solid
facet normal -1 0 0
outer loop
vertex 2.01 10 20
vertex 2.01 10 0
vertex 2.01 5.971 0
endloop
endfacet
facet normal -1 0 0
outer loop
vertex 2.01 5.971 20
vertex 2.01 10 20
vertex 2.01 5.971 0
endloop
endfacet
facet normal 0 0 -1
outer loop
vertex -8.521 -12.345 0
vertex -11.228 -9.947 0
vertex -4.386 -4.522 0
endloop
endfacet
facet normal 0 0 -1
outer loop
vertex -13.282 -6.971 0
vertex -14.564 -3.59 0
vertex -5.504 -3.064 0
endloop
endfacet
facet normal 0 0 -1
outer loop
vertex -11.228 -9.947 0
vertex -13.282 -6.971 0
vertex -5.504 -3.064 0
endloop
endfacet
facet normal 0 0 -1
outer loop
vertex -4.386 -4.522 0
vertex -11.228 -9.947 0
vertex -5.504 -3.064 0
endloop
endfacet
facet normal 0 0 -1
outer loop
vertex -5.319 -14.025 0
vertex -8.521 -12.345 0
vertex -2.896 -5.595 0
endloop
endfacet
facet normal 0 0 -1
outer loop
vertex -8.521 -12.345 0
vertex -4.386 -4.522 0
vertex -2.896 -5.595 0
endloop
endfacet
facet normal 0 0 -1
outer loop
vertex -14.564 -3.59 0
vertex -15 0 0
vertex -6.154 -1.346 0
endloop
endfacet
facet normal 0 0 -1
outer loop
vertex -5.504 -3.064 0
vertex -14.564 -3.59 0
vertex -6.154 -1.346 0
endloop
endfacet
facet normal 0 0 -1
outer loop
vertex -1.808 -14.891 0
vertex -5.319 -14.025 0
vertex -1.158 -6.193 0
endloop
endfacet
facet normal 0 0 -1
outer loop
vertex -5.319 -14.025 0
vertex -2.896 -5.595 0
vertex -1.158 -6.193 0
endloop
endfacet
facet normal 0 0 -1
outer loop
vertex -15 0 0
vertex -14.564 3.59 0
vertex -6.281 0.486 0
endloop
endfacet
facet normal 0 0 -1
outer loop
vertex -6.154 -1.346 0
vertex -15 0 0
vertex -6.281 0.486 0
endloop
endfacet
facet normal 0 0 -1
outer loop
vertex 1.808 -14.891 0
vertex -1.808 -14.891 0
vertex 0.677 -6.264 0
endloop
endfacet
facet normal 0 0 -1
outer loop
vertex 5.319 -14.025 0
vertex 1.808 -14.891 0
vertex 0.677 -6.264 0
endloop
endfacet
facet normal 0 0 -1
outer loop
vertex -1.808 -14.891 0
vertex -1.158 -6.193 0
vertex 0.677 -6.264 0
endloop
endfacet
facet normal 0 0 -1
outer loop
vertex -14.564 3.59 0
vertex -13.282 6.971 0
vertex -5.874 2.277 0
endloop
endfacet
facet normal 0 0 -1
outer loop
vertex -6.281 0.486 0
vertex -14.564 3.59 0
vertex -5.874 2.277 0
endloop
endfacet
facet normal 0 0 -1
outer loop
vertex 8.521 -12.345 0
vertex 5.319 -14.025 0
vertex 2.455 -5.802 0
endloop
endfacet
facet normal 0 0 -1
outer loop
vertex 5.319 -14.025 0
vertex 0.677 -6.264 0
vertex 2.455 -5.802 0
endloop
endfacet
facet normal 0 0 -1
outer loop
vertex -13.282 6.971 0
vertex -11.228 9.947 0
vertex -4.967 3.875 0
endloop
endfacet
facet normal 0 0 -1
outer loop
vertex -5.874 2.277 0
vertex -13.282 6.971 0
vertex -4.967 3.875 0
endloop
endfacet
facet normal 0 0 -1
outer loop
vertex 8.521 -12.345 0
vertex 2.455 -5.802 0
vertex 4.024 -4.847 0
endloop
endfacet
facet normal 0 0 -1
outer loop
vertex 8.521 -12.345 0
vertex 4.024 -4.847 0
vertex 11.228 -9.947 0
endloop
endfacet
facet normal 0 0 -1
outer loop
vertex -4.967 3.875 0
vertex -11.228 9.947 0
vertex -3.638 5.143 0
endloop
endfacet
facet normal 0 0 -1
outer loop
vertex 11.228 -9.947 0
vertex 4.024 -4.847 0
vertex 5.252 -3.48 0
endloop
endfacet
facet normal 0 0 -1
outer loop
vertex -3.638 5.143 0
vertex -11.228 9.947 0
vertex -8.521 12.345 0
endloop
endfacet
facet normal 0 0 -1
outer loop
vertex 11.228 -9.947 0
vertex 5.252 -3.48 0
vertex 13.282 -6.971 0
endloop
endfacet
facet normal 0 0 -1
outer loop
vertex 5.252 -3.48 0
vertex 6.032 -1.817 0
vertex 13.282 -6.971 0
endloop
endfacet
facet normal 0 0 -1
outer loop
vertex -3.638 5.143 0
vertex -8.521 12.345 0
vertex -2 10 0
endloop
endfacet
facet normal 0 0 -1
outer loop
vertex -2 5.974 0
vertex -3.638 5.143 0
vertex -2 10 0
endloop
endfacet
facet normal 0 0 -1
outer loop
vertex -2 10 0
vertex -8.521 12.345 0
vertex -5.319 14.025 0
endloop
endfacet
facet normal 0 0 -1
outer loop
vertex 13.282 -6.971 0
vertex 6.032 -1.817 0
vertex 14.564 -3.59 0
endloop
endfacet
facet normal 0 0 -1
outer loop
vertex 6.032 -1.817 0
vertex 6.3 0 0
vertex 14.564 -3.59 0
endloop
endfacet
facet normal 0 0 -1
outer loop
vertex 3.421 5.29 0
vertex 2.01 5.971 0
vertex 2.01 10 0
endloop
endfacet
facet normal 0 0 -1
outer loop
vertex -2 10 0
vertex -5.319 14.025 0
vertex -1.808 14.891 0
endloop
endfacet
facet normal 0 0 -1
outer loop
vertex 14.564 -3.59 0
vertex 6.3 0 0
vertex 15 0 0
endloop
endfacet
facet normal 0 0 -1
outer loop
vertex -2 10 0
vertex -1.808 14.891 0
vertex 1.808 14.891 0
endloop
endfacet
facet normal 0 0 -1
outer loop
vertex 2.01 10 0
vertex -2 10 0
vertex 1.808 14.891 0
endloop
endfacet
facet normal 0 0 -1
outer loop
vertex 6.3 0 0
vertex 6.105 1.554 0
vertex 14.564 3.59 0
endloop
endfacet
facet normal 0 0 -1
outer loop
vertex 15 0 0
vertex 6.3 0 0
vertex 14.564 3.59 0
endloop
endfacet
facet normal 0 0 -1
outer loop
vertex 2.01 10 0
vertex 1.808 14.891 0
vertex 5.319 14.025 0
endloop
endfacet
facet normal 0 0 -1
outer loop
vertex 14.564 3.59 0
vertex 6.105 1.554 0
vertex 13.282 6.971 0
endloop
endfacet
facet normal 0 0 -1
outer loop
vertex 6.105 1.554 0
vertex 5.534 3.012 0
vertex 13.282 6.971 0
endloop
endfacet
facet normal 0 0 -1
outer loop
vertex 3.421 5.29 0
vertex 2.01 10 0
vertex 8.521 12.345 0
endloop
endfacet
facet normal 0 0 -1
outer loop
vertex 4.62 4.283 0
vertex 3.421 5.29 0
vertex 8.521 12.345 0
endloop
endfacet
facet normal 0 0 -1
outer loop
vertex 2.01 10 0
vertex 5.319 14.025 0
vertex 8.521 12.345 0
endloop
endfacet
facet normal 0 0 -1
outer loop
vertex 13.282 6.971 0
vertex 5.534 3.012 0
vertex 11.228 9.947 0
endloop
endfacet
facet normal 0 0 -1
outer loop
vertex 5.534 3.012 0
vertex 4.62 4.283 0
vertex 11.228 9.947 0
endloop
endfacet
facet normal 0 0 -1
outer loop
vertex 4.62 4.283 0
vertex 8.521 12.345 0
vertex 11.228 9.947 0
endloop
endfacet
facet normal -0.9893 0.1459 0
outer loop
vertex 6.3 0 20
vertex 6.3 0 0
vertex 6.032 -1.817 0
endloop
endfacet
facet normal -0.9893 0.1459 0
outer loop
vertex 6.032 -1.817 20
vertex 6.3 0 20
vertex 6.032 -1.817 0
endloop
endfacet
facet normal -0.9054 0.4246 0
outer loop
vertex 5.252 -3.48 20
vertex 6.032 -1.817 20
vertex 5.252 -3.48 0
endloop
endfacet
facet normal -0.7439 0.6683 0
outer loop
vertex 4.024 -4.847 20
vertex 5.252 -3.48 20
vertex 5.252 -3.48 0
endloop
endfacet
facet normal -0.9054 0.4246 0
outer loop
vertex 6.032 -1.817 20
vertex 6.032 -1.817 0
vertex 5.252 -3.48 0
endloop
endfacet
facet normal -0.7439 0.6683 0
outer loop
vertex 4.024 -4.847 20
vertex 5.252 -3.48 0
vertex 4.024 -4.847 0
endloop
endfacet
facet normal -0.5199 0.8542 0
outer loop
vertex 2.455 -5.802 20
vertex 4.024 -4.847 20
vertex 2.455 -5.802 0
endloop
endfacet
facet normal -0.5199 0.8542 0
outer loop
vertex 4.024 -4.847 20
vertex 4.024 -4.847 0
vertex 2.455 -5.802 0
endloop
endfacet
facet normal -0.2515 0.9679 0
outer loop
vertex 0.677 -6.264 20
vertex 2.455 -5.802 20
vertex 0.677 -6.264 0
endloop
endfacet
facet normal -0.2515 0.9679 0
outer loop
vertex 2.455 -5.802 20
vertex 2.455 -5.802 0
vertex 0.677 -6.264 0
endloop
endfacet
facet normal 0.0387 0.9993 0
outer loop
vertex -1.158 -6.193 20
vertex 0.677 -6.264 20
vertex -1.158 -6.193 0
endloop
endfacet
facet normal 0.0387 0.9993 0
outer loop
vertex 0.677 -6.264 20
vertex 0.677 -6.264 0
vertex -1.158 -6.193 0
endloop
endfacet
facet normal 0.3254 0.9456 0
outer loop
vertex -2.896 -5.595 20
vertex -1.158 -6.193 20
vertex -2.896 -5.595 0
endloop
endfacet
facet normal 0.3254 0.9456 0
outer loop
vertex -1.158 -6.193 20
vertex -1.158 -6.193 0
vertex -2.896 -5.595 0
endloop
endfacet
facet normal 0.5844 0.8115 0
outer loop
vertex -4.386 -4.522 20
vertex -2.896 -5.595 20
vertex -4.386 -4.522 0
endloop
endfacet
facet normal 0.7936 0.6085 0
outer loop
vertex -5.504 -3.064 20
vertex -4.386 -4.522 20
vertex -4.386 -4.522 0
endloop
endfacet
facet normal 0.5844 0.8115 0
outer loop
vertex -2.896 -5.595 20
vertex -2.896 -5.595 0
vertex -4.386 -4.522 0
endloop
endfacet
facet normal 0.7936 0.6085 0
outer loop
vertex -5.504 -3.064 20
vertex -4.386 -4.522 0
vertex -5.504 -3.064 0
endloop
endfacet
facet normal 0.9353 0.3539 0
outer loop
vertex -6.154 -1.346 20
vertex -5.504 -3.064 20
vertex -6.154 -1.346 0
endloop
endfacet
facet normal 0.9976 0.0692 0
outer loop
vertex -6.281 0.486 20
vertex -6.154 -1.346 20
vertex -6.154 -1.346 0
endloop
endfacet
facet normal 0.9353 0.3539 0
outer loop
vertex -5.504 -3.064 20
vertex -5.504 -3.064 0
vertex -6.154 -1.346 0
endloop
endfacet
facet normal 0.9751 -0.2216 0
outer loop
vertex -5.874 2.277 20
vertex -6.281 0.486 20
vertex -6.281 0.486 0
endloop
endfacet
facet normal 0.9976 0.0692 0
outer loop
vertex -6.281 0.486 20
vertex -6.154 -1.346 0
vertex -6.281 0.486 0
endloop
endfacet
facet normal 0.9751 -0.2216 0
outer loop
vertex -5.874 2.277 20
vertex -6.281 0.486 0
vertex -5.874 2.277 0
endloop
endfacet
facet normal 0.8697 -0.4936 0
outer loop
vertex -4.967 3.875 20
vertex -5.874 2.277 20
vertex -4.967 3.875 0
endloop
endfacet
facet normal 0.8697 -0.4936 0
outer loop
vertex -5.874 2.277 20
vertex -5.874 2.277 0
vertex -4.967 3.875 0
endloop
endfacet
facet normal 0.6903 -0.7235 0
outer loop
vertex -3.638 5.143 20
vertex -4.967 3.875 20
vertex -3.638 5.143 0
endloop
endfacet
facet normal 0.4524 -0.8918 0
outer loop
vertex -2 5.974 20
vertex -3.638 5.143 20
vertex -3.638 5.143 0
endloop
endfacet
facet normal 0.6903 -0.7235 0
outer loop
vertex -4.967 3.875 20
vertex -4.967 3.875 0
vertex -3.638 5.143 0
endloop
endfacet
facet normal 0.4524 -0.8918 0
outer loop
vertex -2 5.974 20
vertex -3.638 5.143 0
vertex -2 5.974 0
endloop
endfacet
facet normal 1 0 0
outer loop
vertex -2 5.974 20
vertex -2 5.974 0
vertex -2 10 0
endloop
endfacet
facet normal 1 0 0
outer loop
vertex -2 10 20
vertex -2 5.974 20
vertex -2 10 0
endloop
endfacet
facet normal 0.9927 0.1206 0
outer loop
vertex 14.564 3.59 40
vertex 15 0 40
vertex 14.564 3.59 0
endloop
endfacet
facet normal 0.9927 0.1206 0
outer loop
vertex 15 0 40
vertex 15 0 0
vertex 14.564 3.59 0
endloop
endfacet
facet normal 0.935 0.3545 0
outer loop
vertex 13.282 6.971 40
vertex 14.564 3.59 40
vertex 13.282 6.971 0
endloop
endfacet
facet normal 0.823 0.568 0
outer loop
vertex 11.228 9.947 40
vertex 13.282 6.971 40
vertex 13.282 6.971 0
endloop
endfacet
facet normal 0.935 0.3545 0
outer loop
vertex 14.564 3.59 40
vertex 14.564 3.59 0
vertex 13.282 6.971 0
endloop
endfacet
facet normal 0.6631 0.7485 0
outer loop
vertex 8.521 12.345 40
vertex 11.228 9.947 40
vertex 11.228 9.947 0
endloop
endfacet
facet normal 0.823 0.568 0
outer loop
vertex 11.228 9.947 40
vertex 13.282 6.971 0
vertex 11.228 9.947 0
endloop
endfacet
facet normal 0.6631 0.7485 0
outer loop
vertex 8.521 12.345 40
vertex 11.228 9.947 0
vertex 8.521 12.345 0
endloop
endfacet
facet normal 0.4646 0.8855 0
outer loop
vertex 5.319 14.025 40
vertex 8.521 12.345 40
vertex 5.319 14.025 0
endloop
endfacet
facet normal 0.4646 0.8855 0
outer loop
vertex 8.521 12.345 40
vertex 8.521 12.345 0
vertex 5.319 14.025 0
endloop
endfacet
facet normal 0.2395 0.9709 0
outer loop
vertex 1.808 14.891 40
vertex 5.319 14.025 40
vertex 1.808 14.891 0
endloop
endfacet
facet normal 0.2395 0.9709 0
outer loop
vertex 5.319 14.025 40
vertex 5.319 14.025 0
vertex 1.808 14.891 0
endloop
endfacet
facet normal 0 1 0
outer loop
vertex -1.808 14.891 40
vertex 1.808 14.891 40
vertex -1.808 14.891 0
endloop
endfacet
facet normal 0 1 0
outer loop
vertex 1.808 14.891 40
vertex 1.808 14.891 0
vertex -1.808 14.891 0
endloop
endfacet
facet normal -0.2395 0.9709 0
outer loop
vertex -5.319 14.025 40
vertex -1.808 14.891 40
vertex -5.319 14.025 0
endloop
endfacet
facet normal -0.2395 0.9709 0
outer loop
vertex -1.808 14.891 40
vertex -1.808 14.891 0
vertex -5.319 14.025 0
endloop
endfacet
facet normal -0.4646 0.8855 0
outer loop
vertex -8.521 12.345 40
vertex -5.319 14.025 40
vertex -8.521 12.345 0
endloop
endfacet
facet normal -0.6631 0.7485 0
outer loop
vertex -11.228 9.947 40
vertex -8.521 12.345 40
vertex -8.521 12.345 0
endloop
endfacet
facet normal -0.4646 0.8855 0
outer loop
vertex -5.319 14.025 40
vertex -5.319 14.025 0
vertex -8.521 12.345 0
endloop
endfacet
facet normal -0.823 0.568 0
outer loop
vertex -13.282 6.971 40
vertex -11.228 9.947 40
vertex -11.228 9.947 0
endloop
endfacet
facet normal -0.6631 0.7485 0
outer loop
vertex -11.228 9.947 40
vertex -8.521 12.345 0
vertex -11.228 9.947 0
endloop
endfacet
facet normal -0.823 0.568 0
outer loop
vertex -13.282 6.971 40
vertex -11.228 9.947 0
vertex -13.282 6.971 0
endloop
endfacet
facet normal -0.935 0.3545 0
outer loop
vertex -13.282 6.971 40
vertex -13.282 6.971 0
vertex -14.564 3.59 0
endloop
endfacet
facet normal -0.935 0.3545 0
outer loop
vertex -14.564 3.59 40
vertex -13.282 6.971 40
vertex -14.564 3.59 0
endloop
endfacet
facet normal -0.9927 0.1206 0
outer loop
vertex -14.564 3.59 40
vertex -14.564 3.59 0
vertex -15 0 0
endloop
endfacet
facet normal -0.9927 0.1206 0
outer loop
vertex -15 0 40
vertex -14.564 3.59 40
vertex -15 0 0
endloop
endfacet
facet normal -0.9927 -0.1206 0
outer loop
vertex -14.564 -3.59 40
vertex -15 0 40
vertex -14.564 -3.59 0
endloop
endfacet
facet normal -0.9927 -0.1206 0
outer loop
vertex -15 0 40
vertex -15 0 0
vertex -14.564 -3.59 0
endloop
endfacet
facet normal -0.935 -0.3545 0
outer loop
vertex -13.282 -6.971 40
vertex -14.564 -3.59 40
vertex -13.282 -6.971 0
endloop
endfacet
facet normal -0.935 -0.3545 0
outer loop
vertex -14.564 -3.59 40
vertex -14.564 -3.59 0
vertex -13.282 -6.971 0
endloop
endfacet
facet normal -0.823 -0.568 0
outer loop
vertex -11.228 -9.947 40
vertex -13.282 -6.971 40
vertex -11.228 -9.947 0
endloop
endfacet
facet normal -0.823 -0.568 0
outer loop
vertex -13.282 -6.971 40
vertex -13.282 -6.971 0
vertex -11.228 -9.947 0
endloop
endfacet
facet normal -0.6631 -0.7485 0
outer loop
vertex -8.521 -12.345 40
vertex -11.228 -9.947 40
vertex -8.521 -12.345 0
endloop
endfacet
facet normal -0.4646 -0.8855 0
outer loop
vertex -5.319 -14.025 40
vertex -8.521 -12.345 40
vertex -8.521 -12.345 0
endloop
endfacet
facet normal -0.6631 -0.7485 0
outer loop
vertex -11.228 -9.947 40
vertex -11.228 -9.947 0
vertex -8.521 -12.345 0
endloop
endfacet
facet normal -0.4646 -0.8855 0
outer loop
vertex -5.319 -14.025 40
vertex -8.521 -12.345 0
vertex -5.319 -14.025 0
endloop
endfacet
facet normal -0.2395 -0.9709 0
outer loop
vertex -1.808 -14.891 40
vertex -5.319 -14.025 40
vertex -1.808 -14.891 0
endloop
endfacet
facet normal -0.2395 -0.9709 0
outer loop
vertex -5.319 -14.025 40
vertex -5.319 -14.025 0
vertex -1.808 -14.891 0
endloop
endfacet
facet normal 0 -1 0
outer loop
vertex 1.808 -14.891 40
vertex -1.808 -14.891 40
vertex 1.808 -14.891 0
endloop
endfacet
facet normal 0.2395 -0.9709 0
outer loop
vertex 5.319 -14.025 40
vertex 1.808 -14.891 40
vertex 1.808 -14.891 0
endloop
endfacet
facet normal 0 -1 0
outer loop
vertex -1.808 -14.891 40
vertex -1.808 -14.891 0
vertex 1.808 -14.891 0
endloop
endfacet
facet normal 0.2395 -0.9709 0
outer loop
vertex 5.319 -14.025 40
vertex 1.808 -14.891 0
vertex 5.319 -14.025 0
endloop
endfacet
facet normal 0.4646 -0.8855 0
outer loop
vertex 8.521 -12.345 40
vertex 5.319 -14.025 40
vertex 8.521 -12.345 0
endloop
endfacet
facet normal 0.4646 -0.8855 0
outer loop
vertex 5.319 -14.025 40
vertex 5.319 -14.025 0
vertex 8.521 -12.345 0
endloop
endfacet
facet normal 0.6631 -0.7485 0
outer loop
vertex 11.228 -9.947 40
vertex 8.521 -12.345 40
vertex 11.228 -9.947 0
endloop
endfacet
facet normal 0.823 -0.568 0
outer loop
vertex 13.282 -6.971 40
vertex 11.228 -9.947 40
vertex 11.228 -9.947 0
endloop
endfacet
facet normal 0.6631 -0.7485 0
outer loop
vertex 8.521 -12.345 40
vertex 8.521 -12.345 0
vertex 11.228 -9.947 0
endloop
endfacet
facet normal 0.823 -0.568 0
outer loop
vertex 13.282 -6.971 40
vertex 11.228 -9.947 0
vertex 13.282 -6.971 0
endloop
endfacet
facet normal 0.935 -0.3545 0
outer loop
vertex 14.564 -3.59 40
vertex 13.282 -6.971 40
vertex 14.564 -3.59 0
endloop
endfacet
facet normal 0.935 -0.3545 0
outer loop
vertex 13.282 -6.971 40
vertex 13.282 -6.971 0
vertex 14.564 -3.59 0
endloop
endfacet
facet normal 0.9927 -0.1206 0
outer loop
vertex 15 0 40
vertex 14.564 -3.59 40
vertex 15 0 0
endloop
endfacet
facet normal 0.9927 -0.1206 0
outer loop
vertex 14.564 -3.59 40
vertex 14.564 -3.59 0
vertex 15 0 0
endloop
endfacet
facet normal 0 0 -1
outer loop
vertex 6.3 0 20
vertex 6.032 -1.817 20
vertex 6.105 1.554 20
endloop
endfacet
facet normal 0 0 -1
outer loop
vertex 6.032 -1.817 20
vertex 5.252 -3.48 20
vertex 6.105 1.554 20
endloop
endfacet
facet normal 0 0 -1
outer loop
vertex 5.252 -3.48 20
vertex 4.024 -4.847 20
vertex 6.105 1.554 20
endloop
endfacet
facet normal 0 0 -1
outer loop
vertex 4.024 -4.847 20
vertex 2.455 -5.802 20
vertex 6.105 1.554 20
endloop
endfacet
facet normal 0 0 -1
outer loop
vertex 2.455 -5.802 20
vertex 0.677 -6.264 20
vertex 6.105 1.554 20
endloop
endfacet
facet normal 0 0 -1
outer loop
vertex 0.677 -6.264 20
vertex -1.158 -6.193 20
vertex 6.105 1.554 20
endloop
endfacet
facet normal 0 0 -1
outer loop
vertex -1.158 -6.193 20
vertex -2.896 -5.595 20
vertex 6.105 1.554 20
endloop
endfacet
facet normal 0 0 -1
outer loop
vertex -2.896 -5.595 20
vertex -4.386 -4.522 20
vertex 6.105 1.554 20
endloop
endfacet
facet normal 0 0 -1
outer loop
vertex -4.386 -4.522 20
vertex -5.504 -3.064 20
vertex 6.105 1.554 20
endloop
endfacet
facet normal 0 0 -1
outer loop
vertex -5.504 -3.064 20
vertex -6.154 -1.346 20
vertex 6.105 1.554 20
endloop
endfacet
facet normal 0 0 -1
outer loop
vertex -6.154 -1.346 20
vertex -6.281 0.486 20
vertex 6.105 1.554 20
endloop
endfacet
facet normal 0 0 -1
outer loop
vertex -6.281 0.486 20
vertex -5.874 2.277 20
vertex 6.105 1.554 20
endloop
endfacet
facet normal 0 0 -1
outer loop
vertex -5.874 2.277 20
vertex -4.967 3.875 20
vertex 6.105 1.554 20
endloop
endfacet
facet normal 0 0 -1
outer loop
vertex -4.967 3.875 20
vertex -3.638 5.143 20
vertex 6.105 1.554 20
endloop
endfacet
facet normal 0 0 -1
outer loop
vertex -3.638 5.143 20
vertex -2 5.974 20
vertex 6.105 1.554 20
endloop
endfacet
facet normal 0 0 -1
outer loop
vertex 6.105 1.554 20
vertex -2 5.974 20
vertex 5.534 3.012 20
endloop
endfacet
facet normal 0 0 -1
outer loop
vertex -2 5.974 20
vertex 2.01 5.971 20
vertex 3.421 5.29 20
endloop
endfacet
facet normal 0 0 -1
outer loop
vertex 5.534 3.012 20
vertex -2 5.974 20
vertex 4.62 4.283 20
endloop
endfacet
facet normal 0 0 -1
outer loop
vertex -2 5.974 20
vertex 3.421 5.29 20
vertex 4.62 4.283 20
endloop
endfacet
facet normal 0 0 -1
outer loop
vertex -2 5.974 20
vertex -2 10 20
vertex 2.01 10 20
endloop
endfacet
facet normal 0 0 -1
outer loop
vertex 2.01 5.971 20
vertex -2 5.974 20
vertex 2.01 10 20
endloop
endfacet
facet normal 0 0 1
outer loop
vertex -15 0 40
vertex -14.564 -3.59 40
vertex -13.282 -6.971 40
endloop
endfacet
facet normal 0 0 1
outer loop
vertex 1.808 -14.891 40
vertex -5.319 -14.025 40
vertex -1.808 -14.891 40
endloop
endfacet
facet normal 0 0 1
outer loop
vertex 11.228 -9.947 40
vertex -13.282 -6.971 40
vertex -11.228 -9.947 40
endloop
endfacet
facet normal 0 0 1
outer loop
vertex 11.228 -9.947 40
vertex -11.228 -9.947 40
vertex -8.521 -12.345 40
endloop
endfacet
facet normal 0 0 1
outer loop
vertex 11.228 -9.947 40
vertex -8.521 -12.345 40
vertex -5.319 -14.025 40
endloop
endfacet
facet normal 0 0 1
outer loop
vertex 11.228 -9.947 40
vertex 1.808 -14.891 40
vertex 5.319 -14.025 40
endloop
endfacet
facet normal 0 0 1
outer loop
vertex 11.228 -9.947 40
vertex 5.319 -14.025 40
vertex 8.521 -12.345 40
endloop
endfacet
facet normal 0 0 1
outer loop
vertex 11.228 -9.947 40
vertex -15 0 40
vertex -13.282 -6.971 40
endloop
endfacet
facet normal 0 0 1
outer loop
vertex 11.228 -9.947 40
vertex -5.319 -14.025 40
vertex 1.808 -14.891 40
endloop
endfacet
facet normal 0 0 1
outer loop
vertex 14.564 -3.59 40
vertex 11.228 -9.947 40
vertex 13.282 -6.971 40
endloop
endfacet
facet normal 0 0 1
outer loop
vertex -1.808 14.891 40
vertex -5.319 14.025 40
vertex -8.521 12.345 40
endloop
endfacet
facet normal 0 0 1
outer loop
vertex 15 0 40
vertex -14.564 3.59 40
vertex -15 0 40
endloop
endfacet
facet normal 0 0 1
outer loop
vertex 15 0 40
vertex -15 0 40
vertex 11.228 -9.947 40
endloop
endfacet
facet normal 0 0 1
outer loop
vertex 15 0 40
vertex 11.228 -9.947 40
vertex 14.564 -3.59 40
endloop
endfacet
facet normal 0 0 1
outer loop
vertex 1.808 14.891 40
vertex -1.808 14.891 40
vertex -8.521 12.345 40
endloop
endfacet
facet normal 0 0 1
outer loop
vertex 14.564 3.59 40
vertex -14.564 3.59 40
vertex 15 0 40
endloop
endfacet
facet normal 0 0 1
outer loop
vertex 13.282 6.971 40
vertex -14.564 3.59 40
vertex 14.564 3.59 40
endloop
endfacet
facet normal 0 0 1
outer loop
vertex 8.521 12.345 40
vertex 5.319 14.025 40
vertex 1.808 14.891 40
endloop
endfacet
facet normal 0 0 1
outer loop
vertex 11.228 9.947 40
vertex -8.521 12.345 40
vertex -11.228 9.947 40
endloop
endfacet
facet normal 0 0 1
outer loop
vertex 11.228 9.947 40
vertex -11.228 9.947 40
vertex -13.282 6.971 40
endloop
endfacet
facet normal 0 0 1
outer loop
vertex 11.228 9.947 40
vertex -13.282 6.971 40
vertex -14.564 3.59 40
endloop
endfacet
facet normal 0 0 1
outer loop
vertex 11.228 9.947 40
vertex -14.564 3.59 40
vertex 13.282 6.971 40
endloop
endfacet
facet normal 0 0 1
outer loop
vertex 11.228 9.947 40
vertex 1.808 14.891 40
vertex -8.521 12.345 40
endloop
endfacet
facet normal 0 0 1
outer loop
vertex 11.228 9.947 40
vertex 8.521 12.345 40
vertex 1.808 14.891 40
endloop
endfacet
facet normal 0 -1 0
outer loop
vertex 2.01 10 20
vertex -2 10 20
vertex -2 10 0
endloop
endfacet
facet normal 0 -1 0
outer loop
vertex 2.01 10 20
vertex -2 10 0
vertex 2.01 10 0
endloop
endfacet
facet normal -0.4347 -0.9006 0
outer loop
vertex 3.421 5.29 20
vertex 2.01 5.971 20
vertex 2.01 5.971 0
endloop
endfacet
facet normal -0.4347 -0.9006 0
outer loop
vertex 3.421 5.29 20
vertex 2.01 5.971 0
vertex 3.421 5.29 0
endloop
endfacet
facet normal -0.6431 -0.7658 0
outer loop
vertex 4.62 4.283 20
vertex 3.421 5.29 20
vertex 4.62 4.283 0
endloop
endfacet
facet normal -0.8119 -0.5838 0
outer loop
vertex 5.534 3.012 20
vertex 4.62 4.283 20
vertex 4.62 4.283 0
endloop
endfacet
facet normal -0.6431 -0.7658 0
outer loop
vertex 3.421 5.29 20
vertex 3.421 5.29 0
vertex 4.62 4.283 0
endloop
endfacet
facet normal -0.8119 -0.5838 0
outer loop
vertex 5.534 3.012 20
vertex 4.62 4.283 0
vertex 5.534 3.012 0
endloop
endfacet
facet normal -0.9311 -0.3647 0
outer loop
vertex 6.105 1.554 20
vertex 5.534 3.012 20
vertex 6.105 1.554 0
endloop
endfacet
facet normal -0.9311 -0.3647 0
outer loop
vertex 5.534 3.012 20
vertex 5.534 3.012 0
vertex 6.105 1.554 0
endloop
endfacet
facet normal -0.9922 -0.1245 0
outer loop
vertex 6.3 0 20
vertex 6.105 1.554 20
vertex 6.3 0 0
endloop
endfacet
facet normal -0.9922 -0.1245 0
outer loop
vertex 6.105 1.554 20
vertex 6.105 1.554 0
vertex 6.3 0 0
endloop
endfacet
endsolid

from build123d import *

# Parameters (mm, degrees)
SKETCH1_R           = 15
BOSS_EXTRUDE1_DEPTH = 40
BOSS_EXTRUDE2_START = -20
SKETCH2_R           = 15
BOSS_EXTRUDE2_DEPTH = 20


with BuildPart() as part:
    # Sketch1 → Boss-Extrude1 (new body)
    with BuildSketch(Plane.XY):
        Circle(SKETCH1_R)
        with BuildLine():
            Line((2.010289907, 10), (2.010289907, 5.970656119))
            ThreePointArc((2.010289907, 5.970656119), (5.116386733, 3.675947061), (6.3, 0))
            ThreePointArc((6.3, 0), (-3.680353244, -5.113218165), (-2, 5.974110812))
            Line((-2, 5.974110812), (-2, 10))
            Line((-2, 10), (2.010289907, 10))
        make_face(mode=Mode.SUBTRACT)
    extrude(amount=BOSS_EXTRUDE1_DEPTH)

    # Sketch2 → Boss-Extrude2 (add)
    with BuildSketch(Plane.XY.offset(40).offset(BOSS_EXTRUDE2_START)):
        Circle(SKETCH2_R)
    extrude(amount=BOSS_EXTRUDE2_DEPTH)


solid = part.part
